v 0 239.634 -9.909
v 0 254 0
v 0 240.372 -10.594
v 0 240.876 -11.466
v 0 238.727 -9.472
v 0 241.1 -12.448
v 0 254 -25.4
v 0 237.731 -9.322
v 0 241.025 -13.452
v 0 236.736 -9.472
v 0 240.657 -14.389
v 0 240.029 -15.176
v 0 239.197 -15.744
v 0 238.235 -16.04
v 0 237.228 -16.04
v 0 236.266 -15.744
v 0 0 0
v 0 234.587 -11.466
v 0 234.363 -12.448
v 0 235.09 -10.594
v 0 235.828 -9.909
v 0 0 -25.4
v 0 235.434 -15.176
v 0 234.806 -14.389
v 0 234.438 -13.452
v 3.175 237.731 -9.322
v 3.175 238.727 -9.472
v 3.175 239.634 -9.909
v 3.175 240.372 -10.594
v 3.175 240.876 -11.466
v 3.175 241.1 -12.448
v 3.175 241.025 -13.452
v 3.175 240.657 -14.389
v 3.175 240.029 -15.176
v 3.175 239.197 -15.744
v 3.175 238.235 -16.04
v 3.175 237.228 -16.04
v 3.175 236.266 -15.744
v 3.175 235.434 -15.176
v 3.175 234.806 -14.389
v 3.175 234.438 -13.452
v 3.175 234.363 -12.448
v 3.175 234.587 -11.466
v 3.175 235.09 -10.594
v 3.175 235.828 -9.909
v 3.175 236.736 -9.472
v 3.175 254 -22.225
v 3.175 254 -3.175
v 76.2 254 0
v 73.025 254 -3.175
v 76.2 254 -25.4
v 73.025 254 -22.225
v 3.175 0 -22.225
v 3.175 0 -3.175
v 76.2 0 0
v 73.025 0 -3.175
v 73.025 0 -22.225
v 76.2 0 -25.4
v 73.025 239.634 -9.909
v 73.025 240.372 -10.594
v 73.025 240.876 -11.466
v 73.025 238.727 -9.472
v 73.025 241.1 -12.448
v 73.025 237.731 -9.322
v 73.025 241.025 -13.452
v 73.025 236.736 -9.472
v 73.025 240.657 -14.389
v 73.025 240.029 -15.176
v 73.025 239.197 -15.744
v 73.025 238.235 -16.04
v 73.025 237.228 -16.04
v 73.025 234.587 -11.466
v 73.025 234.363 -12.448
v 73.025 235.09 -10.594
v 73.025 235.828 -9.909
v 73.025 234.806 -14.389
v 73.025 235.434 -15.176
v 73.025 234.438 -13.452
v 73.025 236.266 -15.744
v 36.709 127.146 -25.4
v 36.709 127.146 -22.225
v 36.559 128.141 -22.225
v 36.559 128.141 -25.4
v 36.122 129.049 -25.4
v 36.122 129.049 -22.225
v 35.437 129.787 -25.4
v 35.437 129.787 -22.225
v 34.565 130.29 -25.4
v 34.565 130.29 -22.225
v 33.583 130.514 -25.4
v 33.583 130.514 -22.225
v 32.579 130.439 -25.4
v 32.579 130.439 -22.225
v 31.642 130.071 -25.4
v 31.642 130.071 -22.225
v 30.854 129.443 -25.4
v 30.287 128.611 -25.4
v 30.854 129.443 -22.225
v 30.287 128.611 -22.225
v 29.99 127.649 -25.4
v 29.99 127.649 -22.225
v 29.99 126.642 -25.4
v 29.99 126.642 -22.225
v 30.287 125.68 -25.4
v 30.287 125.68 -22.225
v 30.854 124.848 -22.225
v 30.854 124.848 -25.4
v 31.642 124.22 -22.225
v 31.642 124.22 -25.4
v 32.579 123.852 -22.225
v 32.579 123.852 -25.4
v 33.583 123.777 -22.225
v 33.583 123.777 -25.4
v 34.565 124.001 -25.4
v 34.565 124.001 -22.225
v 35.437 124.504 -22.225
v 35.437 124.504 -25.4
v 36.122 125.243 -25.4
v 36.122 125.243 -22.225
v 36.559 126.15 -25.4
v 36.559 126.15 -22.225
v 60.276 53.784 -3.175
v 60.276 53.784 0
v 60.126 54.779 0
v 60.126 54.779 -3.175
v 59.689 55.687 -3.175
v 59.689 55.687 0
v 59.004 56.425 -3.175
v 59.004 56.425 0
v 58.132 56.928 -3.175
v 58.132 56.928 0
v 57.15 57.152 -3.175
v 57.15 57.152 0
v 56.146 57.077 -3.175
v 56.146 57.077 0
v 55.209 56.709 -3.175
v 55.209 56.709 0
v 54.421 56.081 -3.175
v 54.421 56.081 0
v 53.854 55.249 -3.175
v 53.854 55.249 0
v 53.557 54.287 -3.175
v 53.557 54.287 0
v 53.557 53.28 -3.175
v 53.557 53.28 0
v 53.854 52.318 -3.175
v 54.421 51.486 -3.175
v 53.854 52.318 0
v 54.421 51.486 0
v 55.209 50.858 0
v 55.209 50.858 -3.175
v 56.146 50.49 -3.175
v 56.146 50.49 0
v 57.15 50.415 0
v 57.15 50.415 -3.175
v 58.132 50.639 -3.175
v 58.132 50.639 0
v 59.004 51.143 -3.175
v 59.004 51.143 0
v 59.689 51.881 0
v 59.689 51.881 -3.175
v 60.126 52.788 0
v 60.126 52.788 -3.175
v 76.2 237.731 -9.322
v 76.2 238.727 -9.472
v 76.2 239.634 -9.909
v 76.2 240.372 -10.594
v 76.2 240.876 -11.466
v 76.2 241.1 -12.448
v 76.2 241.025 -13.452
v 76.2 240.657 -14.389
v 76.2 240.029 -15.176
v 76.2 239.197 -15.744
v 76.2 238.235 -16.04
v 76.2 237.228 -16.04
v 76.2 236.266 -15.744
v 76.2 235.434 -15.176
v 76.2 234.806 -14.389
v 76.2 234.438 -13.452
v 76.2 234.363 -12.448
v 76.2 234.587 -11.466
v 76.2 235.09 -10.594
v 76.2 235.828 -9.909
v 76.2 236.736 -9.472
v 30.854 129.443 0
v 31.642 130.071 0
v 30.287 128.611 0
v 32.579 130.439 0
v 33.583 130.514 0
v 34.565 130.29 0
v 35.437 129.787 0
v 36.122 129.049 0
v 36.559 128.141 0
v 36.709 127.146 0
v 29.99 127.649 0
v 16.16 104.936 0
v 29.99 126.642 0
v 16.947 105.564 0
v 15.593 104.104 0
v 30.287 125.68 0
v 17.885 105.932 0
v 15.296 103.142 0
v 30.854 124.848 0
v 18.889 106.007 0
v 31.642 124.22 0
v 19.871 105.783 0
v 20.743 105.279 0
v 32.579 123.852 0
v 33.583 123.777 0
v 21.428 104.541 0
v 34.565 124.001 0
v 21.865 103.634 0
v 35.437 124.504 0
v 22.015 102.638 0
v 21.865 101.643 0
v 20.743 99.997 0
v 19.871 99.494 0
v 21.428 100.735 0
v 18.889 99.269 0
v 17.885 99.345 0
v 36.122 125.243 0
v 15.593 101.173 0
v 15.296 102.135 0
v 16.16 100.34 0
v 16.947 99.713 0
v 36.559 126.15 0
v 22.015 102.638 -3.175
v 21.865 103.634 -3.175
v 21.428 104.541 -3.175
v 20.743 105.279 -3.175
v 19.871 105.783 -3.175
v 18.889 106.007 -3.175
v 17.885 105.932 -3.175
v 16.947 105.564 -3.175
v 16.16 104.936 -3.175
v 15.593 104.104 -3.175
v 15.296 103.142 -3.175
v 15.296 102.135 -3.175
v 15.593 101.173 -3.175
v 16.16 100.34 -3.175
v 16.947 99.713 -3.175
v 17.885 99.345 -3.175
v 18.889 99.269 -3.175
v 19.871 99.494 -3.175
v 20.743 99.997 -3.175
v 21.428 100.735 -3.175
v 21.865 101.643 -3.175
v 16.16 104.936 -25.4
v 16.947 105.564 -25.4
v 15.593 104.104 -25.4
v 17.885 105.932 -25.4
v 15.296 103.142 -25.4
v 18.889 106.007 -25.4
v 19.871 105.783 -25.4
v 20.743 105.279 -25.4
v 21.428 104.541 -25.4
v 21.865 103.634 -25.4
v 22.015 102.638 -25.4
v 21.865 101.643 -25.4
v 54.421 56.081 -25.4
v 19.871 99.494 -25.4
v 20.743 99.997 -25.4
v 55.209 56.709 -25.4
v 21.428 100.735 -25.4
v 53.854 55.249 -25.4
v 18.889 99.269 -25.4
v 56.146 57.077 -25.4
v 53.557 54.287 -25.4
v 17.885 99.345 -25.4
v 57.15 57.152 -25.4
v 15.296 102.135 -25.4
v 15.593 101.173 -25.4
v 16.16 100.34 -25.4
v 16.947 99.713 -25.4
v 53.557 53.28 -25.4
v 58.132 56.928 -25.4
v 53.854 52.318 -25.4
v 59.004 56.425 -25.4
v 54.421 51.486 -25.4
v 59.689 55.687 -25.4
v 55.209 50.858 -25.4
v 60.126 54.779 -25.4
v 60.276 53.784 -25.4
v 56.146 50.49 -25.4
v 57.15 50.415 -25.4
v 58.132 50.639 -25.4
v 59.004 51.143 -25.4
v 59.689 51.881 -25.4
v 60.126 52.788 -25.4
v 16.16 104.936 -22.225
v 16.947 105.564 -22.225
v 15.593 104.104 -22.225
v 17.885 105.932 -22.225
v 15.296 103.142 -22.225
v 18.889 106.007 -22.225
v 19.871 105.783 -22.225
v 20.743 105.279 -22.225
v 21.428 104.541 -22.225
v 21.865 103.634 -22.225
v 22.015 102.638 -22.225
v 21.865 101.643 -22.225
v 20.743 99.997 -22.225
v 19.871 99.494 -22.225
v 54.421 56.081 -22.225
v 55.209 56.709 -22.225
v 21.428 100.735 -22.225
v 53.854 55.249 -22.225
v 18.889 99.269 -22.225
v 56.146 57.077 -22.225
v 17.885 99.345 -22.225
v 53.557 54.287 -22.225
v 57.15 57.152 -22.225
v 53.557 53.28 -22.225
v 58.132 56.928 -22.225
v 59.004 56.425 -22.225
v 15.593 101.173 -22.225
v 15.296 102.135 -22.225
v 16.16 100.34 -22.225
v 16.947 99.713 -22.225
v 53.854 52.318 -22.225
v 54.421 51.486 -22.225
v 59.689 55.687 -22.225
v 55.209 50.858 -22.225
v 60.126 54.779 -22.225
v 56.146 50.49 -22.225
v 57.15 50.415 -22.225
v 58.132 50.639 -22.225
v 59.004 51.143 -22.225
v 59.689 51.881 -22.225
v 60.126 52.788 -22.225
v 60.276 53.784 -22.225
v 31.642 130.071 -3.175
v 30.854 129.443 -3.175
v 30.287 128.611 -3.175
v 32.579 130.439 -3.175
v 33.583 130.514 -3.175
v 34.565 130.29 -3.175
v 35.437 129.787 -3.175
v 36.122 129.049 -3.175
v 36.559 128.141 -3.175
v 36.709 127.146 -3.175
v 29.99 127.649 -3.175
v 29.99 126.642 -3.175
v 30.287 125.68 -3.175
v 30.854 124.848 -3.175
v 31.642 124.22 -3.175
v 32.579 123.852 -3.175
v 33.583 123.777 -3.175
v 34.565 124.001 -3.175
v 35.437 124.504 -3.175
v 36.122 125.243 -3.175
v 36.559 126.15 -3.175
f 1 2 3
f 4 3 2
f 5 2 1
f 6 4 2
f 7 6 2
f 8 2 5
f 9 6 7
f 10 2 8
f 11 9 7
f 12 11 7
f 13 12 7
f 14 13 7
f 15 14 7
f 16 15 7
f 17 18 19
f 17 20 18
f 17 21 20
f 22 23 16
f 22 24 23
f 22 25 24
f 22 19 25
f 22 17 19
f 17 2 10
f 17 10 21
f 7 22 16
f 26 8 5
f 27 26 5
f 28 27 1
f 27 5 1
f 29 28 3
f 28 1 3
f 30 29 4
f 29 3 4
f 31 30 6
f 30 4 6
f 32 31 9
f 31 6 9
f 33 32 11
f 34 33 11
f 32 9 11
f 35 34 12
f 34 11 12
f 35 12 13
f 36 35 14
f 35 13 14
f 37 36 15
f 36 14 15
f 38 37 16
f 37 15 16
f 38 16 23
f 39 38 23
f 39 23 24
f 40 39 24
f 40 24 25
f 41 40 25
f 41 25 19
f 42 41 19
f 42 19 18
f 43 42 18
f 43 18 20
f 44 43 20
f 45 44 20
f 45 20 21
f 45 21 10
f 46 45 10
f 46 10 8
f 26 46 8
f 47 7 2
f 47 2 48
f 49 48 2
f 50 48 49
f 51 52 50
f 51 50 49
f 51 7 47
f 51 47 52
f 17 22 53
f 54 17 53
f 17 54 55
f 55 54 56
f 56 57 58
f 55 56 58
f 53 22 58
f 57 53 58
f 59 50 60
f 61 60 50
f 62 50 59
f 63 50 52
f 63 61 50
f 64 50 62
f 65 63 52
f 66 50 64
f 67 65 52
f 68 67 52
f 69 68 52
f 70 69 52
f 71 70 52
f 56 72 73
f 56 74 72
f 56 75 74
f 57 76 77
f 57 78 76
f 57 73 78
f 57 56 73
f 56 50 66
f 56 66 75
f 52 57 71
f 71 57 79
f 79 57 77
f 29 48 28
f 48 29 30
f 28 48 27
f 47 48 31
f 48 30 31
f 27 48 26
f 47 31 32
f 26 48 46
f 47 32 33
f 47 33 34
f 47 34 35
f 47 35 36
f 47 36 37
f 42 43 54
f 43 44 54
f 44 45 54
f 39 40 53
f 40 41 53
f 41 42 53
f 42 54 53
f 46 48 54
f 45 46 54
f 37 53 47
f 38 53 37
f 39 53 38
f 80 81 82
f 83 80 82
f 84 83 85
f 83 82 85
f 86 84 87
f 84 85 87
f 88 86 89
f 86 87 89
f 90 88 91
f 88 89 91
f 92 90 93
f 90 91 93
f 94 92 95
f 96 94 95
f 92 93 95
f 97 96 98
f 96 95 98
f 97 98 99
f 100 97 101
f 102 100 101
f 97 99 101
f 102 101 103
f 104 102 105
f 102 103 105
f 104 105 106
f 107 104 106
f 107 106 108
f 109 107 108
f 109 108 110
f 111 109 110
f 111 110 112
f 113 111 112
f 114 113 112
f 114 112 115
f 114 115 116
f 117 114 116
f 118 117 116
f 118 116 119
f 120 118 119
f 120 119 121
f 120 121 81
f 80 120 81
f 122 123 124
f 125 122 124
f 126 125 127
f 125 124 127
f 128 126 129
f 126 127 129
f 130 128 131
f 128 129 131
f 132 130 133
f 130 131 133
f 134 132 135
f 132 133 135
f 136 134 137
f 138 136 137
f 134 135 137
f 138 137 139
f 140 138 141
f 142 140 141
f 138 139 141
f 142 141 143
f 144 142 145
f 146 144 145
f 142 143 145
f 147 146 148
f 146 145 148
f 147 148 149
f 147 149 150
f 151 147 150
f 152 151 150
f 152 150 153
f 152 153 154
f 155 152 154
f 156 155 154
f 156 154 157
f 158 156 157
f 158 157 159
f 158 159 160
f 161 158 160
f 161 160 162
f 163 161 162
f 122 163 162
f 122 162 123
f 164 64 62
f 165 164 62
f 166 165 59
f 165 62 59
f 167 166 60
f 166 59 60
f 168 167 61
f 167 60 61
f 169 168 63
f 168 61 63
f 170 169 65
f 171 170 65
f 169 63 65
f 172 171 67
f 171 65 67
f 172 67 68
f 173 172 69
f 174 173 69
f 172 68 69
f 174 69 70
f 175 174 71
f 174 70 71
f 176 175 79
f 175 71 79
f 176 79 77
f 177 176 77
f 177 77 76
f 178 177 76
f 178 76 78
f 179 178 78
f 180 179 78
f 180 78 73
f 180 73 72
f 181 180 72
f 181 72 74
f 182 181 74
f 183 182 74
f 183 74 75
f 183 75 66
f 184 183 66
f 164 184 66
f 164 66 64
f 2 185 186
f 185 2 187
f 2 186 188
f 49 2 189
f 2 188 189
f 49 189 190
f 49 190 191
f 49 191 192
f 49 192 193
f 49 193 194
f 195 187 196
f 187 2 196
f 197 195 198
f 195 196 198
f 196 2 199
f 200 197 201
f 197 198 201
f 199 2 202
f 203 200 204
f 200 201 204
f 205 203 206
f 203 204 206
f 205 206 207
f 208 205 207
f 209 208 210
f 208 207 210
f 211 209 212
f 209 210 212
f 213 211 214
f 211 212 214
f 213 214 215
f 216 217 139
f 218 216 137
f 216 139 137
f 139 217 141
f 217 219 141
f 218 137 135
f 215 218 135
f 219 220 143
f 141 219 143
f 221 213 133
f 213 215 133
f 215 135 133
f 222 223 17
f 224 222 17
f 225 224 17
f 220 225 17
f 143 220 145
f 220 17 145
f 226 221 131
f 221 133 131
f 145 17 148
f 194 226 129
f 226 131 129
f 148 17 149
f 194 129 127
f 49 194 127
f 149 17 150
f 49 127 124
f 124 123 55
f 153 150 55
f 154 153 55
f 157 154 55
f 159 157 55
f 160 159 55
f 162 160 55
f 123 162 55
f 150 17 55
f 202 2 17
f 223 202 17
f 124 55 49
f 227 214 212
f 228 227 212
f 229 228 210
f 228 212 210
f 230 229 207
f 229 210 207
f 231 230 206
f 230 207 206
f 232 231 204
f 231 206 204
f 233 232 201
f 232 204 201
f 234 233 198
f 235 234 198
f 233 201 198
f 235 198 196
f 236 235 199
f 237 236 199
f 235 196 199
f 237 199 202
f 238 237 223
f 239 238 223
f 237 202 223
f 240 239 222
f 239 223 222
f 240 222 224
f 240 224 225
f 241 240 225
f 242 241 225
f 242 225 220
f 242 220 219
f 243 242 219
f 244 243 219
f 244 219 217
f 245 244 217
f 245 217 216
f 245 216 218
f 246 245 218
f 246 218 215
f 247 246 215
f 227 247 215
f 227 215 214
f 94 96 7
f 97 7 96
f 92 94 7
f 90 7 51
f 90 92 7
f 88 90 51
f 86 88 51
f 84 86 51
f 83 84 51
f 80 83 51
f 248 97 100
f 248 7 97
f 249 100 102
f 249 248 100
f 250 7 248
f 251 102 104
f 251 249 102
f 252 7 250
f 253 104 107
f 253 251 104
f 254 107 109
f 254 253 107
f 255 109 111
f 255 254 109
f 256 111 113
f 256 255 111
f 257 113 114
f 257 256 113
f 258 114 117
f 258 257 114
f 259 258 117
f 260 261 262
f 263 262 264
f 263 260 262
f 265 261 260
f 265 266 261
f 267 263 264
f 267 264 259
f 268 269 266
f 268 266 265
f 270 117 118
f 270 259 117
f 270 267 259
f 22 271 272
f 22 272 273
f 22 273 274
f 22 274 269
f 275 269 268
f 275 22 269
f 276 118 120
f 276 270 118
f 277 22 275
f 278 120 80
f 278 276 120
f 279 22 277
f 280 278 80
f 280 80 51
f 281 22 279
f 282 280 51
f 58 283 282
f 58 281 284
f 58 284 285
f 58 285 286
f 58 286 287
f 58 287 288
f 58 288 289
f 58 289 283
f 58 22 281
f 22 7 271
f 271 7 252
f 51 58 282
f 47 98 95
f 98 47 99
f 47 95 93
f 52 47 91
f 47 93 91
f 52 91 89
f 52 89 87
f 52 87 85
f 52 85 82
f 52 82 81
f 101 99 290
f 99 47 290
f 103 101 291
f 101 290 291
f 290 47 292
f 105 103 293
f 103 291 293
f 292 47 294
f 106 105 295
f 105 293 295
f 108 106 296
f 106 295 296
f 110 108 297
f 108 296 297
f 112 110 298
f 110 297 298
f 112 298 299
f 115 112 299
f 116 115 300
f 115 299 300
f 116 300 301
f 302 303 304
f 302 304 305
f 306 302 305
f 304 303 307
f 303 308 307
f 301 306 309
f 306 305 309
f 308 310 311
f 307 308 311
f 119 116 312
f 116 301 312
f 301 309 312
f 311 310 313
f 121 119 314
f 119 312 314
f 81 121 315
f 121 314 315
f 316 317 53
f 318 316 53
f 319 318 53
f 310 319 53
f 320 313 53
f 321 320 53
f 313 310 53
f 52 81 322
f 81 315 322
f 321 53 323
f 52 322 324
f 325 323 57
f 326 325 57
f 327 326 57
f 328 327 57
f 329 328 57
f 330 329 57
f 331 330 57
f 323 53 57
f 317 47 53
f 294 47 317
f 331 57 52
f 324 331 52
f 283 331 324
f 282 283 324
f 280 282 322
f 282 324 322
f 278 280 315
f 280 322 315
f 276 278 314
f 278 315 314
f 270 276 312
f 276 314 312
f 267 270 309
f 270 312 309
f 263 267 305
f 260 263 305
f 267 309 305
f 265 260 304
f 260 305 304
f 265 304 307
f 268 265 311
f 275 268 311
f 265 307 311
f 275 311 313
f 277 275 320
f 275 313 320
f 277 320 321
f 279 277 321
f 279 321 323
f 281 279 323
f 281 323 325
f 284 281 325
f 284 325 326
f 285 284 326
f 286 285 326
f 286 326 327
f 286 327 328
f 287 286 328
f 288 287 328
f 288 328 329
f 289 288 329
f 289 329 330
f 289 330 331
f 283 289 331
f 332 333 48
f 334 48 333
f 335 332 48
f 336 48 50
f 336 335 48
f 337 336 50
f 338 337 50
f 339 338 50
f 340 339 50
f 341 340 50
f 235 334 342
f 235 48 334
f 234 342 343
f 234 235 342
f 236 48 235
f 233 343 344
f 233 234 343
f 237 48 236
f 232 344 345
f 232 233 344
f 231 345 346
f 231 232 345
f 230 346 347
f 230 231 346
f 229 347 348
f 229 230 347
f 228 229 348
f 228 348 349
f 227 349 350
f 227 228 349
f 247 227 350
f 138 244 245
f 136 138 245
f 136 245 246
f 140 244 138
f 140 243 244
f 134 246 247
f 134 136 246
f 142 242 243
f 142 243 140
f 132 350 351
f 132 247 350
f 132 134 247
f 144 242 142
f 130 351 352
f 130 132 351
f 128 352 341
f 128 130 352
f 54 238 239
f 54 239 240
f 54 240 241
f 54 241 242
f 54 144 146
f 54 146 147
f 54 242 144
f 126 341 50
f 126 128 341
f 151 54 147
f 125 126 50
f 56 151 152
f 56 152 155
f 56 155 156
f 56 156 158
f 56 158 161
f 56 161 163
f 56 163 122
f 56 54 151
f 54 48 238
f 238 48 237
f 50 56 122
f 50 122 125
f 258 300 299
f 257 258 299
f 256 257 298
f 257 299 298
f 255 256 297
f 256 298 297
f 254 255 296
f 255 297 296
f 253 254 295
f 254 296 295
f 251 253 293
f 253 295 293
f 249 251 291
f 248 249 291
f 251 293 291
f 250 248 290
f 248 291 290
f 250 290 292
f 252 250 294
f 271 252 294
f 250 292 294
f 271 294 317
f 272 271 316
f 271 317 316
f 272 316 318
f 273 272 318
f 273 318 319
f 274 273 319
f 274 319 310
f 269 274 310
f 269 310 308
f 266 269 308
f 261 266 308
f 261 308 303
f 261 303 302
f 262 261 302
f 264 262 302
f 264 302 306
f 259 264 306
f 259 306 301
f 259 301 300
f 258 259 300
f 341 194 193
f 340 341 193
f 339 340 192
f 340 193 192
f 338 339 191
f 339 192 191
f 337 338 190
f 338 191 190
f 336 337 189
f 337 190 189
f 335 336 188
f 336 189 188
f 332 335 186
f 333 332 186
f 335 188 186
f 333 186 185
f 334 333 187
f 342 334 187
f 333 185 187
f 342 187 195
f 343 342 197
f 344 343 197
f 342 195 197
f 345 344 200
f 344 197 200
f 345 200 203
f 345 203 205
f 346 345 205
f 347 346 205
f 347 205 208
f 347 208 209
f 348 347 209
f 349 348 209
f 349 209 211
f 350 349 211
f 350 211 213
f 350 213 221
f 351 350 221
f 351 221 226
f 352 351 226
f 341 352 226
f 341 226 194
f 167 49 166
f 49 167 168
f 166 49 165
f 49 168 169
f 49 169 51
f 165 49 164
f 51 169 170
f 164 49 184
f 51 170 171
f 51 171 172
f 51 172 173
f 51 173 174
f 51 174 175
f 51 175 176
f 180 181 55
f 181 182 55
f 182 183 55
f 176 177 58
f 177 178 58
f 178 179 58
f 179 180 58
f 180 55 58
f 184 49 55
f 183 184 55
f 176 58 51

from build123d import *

# Parameters (mm, degrees)
SKETCH1_W               = 76.2
SKETCH1_H               = 25.4
SKETCH1_W_2             = 69.85
SKETCH1_H_2             = 19.05
BOSS_EXTRUDE1_DEPTH     = 254
SKETCH3_R               = 3.3782
CUT_EXTRUDE1_DEPTH      = 26.4
SKETCH4_R               = 3.3782
CUT_EXTRUDE2_DEPTH      = 1
CUT_EXTRUDE2_DEPTH_BACK = 77.2


with BuildPart() as part:
    # Sketch1 → Boss-Extrude1 (new body)
    with BuildSketch(Plane(origin=(0, 0, 0), x_dir=(1, 0, 0), z_dir=(0, 1, 0))):
        with Locations((38.1, 12.7)):
            Rectangle(SKETCH1_W, SKETCH1_H)
        with Locations((38.1, 12.7)):
            Rectangle(SKETCH1_W_2, SKETCH1_H_2, mode=Mode.SUBTRACT)
    extrude(amount=BOSS_EXTRUDE1_DEPTH)

    # Sketch3 → Cut-Extrude1 (cut, through all)
    with BuildSketch(Plane.XY):
        with Locations((56.897712706, 53.783695383)):
            Circle(SKETCH3_R)
        with Locations((18.636431119, 102.638247629)):
            Circle(SKETCH3_R)
        with Locations((33.330604718, 127.14563197)):
            Circle(SKETCH3_R)
    extrude(amount=-CUT_EXTRUDE1_DEPTH, mode=Mode.SUBTRACT)

    # Sketch4 → Cut-Extrude2 (cut, two sides)
    with BuildSketch(Plane.ZY) as cut_extrude2_sk:
        with Locations((-12.7, 237.7313)):
            Circle(SKETCH4_R)
    extrude(amount=CUT_EXTRUDE2_DEPTH, mode=Mode.SUBTRACT)
    extrude(cut_extrude2_sk.sketch, amount=-CUT_EXTRUDE2_DEPTH_BACK, mode=Mode.SUBTRACT)


solid = part.part
